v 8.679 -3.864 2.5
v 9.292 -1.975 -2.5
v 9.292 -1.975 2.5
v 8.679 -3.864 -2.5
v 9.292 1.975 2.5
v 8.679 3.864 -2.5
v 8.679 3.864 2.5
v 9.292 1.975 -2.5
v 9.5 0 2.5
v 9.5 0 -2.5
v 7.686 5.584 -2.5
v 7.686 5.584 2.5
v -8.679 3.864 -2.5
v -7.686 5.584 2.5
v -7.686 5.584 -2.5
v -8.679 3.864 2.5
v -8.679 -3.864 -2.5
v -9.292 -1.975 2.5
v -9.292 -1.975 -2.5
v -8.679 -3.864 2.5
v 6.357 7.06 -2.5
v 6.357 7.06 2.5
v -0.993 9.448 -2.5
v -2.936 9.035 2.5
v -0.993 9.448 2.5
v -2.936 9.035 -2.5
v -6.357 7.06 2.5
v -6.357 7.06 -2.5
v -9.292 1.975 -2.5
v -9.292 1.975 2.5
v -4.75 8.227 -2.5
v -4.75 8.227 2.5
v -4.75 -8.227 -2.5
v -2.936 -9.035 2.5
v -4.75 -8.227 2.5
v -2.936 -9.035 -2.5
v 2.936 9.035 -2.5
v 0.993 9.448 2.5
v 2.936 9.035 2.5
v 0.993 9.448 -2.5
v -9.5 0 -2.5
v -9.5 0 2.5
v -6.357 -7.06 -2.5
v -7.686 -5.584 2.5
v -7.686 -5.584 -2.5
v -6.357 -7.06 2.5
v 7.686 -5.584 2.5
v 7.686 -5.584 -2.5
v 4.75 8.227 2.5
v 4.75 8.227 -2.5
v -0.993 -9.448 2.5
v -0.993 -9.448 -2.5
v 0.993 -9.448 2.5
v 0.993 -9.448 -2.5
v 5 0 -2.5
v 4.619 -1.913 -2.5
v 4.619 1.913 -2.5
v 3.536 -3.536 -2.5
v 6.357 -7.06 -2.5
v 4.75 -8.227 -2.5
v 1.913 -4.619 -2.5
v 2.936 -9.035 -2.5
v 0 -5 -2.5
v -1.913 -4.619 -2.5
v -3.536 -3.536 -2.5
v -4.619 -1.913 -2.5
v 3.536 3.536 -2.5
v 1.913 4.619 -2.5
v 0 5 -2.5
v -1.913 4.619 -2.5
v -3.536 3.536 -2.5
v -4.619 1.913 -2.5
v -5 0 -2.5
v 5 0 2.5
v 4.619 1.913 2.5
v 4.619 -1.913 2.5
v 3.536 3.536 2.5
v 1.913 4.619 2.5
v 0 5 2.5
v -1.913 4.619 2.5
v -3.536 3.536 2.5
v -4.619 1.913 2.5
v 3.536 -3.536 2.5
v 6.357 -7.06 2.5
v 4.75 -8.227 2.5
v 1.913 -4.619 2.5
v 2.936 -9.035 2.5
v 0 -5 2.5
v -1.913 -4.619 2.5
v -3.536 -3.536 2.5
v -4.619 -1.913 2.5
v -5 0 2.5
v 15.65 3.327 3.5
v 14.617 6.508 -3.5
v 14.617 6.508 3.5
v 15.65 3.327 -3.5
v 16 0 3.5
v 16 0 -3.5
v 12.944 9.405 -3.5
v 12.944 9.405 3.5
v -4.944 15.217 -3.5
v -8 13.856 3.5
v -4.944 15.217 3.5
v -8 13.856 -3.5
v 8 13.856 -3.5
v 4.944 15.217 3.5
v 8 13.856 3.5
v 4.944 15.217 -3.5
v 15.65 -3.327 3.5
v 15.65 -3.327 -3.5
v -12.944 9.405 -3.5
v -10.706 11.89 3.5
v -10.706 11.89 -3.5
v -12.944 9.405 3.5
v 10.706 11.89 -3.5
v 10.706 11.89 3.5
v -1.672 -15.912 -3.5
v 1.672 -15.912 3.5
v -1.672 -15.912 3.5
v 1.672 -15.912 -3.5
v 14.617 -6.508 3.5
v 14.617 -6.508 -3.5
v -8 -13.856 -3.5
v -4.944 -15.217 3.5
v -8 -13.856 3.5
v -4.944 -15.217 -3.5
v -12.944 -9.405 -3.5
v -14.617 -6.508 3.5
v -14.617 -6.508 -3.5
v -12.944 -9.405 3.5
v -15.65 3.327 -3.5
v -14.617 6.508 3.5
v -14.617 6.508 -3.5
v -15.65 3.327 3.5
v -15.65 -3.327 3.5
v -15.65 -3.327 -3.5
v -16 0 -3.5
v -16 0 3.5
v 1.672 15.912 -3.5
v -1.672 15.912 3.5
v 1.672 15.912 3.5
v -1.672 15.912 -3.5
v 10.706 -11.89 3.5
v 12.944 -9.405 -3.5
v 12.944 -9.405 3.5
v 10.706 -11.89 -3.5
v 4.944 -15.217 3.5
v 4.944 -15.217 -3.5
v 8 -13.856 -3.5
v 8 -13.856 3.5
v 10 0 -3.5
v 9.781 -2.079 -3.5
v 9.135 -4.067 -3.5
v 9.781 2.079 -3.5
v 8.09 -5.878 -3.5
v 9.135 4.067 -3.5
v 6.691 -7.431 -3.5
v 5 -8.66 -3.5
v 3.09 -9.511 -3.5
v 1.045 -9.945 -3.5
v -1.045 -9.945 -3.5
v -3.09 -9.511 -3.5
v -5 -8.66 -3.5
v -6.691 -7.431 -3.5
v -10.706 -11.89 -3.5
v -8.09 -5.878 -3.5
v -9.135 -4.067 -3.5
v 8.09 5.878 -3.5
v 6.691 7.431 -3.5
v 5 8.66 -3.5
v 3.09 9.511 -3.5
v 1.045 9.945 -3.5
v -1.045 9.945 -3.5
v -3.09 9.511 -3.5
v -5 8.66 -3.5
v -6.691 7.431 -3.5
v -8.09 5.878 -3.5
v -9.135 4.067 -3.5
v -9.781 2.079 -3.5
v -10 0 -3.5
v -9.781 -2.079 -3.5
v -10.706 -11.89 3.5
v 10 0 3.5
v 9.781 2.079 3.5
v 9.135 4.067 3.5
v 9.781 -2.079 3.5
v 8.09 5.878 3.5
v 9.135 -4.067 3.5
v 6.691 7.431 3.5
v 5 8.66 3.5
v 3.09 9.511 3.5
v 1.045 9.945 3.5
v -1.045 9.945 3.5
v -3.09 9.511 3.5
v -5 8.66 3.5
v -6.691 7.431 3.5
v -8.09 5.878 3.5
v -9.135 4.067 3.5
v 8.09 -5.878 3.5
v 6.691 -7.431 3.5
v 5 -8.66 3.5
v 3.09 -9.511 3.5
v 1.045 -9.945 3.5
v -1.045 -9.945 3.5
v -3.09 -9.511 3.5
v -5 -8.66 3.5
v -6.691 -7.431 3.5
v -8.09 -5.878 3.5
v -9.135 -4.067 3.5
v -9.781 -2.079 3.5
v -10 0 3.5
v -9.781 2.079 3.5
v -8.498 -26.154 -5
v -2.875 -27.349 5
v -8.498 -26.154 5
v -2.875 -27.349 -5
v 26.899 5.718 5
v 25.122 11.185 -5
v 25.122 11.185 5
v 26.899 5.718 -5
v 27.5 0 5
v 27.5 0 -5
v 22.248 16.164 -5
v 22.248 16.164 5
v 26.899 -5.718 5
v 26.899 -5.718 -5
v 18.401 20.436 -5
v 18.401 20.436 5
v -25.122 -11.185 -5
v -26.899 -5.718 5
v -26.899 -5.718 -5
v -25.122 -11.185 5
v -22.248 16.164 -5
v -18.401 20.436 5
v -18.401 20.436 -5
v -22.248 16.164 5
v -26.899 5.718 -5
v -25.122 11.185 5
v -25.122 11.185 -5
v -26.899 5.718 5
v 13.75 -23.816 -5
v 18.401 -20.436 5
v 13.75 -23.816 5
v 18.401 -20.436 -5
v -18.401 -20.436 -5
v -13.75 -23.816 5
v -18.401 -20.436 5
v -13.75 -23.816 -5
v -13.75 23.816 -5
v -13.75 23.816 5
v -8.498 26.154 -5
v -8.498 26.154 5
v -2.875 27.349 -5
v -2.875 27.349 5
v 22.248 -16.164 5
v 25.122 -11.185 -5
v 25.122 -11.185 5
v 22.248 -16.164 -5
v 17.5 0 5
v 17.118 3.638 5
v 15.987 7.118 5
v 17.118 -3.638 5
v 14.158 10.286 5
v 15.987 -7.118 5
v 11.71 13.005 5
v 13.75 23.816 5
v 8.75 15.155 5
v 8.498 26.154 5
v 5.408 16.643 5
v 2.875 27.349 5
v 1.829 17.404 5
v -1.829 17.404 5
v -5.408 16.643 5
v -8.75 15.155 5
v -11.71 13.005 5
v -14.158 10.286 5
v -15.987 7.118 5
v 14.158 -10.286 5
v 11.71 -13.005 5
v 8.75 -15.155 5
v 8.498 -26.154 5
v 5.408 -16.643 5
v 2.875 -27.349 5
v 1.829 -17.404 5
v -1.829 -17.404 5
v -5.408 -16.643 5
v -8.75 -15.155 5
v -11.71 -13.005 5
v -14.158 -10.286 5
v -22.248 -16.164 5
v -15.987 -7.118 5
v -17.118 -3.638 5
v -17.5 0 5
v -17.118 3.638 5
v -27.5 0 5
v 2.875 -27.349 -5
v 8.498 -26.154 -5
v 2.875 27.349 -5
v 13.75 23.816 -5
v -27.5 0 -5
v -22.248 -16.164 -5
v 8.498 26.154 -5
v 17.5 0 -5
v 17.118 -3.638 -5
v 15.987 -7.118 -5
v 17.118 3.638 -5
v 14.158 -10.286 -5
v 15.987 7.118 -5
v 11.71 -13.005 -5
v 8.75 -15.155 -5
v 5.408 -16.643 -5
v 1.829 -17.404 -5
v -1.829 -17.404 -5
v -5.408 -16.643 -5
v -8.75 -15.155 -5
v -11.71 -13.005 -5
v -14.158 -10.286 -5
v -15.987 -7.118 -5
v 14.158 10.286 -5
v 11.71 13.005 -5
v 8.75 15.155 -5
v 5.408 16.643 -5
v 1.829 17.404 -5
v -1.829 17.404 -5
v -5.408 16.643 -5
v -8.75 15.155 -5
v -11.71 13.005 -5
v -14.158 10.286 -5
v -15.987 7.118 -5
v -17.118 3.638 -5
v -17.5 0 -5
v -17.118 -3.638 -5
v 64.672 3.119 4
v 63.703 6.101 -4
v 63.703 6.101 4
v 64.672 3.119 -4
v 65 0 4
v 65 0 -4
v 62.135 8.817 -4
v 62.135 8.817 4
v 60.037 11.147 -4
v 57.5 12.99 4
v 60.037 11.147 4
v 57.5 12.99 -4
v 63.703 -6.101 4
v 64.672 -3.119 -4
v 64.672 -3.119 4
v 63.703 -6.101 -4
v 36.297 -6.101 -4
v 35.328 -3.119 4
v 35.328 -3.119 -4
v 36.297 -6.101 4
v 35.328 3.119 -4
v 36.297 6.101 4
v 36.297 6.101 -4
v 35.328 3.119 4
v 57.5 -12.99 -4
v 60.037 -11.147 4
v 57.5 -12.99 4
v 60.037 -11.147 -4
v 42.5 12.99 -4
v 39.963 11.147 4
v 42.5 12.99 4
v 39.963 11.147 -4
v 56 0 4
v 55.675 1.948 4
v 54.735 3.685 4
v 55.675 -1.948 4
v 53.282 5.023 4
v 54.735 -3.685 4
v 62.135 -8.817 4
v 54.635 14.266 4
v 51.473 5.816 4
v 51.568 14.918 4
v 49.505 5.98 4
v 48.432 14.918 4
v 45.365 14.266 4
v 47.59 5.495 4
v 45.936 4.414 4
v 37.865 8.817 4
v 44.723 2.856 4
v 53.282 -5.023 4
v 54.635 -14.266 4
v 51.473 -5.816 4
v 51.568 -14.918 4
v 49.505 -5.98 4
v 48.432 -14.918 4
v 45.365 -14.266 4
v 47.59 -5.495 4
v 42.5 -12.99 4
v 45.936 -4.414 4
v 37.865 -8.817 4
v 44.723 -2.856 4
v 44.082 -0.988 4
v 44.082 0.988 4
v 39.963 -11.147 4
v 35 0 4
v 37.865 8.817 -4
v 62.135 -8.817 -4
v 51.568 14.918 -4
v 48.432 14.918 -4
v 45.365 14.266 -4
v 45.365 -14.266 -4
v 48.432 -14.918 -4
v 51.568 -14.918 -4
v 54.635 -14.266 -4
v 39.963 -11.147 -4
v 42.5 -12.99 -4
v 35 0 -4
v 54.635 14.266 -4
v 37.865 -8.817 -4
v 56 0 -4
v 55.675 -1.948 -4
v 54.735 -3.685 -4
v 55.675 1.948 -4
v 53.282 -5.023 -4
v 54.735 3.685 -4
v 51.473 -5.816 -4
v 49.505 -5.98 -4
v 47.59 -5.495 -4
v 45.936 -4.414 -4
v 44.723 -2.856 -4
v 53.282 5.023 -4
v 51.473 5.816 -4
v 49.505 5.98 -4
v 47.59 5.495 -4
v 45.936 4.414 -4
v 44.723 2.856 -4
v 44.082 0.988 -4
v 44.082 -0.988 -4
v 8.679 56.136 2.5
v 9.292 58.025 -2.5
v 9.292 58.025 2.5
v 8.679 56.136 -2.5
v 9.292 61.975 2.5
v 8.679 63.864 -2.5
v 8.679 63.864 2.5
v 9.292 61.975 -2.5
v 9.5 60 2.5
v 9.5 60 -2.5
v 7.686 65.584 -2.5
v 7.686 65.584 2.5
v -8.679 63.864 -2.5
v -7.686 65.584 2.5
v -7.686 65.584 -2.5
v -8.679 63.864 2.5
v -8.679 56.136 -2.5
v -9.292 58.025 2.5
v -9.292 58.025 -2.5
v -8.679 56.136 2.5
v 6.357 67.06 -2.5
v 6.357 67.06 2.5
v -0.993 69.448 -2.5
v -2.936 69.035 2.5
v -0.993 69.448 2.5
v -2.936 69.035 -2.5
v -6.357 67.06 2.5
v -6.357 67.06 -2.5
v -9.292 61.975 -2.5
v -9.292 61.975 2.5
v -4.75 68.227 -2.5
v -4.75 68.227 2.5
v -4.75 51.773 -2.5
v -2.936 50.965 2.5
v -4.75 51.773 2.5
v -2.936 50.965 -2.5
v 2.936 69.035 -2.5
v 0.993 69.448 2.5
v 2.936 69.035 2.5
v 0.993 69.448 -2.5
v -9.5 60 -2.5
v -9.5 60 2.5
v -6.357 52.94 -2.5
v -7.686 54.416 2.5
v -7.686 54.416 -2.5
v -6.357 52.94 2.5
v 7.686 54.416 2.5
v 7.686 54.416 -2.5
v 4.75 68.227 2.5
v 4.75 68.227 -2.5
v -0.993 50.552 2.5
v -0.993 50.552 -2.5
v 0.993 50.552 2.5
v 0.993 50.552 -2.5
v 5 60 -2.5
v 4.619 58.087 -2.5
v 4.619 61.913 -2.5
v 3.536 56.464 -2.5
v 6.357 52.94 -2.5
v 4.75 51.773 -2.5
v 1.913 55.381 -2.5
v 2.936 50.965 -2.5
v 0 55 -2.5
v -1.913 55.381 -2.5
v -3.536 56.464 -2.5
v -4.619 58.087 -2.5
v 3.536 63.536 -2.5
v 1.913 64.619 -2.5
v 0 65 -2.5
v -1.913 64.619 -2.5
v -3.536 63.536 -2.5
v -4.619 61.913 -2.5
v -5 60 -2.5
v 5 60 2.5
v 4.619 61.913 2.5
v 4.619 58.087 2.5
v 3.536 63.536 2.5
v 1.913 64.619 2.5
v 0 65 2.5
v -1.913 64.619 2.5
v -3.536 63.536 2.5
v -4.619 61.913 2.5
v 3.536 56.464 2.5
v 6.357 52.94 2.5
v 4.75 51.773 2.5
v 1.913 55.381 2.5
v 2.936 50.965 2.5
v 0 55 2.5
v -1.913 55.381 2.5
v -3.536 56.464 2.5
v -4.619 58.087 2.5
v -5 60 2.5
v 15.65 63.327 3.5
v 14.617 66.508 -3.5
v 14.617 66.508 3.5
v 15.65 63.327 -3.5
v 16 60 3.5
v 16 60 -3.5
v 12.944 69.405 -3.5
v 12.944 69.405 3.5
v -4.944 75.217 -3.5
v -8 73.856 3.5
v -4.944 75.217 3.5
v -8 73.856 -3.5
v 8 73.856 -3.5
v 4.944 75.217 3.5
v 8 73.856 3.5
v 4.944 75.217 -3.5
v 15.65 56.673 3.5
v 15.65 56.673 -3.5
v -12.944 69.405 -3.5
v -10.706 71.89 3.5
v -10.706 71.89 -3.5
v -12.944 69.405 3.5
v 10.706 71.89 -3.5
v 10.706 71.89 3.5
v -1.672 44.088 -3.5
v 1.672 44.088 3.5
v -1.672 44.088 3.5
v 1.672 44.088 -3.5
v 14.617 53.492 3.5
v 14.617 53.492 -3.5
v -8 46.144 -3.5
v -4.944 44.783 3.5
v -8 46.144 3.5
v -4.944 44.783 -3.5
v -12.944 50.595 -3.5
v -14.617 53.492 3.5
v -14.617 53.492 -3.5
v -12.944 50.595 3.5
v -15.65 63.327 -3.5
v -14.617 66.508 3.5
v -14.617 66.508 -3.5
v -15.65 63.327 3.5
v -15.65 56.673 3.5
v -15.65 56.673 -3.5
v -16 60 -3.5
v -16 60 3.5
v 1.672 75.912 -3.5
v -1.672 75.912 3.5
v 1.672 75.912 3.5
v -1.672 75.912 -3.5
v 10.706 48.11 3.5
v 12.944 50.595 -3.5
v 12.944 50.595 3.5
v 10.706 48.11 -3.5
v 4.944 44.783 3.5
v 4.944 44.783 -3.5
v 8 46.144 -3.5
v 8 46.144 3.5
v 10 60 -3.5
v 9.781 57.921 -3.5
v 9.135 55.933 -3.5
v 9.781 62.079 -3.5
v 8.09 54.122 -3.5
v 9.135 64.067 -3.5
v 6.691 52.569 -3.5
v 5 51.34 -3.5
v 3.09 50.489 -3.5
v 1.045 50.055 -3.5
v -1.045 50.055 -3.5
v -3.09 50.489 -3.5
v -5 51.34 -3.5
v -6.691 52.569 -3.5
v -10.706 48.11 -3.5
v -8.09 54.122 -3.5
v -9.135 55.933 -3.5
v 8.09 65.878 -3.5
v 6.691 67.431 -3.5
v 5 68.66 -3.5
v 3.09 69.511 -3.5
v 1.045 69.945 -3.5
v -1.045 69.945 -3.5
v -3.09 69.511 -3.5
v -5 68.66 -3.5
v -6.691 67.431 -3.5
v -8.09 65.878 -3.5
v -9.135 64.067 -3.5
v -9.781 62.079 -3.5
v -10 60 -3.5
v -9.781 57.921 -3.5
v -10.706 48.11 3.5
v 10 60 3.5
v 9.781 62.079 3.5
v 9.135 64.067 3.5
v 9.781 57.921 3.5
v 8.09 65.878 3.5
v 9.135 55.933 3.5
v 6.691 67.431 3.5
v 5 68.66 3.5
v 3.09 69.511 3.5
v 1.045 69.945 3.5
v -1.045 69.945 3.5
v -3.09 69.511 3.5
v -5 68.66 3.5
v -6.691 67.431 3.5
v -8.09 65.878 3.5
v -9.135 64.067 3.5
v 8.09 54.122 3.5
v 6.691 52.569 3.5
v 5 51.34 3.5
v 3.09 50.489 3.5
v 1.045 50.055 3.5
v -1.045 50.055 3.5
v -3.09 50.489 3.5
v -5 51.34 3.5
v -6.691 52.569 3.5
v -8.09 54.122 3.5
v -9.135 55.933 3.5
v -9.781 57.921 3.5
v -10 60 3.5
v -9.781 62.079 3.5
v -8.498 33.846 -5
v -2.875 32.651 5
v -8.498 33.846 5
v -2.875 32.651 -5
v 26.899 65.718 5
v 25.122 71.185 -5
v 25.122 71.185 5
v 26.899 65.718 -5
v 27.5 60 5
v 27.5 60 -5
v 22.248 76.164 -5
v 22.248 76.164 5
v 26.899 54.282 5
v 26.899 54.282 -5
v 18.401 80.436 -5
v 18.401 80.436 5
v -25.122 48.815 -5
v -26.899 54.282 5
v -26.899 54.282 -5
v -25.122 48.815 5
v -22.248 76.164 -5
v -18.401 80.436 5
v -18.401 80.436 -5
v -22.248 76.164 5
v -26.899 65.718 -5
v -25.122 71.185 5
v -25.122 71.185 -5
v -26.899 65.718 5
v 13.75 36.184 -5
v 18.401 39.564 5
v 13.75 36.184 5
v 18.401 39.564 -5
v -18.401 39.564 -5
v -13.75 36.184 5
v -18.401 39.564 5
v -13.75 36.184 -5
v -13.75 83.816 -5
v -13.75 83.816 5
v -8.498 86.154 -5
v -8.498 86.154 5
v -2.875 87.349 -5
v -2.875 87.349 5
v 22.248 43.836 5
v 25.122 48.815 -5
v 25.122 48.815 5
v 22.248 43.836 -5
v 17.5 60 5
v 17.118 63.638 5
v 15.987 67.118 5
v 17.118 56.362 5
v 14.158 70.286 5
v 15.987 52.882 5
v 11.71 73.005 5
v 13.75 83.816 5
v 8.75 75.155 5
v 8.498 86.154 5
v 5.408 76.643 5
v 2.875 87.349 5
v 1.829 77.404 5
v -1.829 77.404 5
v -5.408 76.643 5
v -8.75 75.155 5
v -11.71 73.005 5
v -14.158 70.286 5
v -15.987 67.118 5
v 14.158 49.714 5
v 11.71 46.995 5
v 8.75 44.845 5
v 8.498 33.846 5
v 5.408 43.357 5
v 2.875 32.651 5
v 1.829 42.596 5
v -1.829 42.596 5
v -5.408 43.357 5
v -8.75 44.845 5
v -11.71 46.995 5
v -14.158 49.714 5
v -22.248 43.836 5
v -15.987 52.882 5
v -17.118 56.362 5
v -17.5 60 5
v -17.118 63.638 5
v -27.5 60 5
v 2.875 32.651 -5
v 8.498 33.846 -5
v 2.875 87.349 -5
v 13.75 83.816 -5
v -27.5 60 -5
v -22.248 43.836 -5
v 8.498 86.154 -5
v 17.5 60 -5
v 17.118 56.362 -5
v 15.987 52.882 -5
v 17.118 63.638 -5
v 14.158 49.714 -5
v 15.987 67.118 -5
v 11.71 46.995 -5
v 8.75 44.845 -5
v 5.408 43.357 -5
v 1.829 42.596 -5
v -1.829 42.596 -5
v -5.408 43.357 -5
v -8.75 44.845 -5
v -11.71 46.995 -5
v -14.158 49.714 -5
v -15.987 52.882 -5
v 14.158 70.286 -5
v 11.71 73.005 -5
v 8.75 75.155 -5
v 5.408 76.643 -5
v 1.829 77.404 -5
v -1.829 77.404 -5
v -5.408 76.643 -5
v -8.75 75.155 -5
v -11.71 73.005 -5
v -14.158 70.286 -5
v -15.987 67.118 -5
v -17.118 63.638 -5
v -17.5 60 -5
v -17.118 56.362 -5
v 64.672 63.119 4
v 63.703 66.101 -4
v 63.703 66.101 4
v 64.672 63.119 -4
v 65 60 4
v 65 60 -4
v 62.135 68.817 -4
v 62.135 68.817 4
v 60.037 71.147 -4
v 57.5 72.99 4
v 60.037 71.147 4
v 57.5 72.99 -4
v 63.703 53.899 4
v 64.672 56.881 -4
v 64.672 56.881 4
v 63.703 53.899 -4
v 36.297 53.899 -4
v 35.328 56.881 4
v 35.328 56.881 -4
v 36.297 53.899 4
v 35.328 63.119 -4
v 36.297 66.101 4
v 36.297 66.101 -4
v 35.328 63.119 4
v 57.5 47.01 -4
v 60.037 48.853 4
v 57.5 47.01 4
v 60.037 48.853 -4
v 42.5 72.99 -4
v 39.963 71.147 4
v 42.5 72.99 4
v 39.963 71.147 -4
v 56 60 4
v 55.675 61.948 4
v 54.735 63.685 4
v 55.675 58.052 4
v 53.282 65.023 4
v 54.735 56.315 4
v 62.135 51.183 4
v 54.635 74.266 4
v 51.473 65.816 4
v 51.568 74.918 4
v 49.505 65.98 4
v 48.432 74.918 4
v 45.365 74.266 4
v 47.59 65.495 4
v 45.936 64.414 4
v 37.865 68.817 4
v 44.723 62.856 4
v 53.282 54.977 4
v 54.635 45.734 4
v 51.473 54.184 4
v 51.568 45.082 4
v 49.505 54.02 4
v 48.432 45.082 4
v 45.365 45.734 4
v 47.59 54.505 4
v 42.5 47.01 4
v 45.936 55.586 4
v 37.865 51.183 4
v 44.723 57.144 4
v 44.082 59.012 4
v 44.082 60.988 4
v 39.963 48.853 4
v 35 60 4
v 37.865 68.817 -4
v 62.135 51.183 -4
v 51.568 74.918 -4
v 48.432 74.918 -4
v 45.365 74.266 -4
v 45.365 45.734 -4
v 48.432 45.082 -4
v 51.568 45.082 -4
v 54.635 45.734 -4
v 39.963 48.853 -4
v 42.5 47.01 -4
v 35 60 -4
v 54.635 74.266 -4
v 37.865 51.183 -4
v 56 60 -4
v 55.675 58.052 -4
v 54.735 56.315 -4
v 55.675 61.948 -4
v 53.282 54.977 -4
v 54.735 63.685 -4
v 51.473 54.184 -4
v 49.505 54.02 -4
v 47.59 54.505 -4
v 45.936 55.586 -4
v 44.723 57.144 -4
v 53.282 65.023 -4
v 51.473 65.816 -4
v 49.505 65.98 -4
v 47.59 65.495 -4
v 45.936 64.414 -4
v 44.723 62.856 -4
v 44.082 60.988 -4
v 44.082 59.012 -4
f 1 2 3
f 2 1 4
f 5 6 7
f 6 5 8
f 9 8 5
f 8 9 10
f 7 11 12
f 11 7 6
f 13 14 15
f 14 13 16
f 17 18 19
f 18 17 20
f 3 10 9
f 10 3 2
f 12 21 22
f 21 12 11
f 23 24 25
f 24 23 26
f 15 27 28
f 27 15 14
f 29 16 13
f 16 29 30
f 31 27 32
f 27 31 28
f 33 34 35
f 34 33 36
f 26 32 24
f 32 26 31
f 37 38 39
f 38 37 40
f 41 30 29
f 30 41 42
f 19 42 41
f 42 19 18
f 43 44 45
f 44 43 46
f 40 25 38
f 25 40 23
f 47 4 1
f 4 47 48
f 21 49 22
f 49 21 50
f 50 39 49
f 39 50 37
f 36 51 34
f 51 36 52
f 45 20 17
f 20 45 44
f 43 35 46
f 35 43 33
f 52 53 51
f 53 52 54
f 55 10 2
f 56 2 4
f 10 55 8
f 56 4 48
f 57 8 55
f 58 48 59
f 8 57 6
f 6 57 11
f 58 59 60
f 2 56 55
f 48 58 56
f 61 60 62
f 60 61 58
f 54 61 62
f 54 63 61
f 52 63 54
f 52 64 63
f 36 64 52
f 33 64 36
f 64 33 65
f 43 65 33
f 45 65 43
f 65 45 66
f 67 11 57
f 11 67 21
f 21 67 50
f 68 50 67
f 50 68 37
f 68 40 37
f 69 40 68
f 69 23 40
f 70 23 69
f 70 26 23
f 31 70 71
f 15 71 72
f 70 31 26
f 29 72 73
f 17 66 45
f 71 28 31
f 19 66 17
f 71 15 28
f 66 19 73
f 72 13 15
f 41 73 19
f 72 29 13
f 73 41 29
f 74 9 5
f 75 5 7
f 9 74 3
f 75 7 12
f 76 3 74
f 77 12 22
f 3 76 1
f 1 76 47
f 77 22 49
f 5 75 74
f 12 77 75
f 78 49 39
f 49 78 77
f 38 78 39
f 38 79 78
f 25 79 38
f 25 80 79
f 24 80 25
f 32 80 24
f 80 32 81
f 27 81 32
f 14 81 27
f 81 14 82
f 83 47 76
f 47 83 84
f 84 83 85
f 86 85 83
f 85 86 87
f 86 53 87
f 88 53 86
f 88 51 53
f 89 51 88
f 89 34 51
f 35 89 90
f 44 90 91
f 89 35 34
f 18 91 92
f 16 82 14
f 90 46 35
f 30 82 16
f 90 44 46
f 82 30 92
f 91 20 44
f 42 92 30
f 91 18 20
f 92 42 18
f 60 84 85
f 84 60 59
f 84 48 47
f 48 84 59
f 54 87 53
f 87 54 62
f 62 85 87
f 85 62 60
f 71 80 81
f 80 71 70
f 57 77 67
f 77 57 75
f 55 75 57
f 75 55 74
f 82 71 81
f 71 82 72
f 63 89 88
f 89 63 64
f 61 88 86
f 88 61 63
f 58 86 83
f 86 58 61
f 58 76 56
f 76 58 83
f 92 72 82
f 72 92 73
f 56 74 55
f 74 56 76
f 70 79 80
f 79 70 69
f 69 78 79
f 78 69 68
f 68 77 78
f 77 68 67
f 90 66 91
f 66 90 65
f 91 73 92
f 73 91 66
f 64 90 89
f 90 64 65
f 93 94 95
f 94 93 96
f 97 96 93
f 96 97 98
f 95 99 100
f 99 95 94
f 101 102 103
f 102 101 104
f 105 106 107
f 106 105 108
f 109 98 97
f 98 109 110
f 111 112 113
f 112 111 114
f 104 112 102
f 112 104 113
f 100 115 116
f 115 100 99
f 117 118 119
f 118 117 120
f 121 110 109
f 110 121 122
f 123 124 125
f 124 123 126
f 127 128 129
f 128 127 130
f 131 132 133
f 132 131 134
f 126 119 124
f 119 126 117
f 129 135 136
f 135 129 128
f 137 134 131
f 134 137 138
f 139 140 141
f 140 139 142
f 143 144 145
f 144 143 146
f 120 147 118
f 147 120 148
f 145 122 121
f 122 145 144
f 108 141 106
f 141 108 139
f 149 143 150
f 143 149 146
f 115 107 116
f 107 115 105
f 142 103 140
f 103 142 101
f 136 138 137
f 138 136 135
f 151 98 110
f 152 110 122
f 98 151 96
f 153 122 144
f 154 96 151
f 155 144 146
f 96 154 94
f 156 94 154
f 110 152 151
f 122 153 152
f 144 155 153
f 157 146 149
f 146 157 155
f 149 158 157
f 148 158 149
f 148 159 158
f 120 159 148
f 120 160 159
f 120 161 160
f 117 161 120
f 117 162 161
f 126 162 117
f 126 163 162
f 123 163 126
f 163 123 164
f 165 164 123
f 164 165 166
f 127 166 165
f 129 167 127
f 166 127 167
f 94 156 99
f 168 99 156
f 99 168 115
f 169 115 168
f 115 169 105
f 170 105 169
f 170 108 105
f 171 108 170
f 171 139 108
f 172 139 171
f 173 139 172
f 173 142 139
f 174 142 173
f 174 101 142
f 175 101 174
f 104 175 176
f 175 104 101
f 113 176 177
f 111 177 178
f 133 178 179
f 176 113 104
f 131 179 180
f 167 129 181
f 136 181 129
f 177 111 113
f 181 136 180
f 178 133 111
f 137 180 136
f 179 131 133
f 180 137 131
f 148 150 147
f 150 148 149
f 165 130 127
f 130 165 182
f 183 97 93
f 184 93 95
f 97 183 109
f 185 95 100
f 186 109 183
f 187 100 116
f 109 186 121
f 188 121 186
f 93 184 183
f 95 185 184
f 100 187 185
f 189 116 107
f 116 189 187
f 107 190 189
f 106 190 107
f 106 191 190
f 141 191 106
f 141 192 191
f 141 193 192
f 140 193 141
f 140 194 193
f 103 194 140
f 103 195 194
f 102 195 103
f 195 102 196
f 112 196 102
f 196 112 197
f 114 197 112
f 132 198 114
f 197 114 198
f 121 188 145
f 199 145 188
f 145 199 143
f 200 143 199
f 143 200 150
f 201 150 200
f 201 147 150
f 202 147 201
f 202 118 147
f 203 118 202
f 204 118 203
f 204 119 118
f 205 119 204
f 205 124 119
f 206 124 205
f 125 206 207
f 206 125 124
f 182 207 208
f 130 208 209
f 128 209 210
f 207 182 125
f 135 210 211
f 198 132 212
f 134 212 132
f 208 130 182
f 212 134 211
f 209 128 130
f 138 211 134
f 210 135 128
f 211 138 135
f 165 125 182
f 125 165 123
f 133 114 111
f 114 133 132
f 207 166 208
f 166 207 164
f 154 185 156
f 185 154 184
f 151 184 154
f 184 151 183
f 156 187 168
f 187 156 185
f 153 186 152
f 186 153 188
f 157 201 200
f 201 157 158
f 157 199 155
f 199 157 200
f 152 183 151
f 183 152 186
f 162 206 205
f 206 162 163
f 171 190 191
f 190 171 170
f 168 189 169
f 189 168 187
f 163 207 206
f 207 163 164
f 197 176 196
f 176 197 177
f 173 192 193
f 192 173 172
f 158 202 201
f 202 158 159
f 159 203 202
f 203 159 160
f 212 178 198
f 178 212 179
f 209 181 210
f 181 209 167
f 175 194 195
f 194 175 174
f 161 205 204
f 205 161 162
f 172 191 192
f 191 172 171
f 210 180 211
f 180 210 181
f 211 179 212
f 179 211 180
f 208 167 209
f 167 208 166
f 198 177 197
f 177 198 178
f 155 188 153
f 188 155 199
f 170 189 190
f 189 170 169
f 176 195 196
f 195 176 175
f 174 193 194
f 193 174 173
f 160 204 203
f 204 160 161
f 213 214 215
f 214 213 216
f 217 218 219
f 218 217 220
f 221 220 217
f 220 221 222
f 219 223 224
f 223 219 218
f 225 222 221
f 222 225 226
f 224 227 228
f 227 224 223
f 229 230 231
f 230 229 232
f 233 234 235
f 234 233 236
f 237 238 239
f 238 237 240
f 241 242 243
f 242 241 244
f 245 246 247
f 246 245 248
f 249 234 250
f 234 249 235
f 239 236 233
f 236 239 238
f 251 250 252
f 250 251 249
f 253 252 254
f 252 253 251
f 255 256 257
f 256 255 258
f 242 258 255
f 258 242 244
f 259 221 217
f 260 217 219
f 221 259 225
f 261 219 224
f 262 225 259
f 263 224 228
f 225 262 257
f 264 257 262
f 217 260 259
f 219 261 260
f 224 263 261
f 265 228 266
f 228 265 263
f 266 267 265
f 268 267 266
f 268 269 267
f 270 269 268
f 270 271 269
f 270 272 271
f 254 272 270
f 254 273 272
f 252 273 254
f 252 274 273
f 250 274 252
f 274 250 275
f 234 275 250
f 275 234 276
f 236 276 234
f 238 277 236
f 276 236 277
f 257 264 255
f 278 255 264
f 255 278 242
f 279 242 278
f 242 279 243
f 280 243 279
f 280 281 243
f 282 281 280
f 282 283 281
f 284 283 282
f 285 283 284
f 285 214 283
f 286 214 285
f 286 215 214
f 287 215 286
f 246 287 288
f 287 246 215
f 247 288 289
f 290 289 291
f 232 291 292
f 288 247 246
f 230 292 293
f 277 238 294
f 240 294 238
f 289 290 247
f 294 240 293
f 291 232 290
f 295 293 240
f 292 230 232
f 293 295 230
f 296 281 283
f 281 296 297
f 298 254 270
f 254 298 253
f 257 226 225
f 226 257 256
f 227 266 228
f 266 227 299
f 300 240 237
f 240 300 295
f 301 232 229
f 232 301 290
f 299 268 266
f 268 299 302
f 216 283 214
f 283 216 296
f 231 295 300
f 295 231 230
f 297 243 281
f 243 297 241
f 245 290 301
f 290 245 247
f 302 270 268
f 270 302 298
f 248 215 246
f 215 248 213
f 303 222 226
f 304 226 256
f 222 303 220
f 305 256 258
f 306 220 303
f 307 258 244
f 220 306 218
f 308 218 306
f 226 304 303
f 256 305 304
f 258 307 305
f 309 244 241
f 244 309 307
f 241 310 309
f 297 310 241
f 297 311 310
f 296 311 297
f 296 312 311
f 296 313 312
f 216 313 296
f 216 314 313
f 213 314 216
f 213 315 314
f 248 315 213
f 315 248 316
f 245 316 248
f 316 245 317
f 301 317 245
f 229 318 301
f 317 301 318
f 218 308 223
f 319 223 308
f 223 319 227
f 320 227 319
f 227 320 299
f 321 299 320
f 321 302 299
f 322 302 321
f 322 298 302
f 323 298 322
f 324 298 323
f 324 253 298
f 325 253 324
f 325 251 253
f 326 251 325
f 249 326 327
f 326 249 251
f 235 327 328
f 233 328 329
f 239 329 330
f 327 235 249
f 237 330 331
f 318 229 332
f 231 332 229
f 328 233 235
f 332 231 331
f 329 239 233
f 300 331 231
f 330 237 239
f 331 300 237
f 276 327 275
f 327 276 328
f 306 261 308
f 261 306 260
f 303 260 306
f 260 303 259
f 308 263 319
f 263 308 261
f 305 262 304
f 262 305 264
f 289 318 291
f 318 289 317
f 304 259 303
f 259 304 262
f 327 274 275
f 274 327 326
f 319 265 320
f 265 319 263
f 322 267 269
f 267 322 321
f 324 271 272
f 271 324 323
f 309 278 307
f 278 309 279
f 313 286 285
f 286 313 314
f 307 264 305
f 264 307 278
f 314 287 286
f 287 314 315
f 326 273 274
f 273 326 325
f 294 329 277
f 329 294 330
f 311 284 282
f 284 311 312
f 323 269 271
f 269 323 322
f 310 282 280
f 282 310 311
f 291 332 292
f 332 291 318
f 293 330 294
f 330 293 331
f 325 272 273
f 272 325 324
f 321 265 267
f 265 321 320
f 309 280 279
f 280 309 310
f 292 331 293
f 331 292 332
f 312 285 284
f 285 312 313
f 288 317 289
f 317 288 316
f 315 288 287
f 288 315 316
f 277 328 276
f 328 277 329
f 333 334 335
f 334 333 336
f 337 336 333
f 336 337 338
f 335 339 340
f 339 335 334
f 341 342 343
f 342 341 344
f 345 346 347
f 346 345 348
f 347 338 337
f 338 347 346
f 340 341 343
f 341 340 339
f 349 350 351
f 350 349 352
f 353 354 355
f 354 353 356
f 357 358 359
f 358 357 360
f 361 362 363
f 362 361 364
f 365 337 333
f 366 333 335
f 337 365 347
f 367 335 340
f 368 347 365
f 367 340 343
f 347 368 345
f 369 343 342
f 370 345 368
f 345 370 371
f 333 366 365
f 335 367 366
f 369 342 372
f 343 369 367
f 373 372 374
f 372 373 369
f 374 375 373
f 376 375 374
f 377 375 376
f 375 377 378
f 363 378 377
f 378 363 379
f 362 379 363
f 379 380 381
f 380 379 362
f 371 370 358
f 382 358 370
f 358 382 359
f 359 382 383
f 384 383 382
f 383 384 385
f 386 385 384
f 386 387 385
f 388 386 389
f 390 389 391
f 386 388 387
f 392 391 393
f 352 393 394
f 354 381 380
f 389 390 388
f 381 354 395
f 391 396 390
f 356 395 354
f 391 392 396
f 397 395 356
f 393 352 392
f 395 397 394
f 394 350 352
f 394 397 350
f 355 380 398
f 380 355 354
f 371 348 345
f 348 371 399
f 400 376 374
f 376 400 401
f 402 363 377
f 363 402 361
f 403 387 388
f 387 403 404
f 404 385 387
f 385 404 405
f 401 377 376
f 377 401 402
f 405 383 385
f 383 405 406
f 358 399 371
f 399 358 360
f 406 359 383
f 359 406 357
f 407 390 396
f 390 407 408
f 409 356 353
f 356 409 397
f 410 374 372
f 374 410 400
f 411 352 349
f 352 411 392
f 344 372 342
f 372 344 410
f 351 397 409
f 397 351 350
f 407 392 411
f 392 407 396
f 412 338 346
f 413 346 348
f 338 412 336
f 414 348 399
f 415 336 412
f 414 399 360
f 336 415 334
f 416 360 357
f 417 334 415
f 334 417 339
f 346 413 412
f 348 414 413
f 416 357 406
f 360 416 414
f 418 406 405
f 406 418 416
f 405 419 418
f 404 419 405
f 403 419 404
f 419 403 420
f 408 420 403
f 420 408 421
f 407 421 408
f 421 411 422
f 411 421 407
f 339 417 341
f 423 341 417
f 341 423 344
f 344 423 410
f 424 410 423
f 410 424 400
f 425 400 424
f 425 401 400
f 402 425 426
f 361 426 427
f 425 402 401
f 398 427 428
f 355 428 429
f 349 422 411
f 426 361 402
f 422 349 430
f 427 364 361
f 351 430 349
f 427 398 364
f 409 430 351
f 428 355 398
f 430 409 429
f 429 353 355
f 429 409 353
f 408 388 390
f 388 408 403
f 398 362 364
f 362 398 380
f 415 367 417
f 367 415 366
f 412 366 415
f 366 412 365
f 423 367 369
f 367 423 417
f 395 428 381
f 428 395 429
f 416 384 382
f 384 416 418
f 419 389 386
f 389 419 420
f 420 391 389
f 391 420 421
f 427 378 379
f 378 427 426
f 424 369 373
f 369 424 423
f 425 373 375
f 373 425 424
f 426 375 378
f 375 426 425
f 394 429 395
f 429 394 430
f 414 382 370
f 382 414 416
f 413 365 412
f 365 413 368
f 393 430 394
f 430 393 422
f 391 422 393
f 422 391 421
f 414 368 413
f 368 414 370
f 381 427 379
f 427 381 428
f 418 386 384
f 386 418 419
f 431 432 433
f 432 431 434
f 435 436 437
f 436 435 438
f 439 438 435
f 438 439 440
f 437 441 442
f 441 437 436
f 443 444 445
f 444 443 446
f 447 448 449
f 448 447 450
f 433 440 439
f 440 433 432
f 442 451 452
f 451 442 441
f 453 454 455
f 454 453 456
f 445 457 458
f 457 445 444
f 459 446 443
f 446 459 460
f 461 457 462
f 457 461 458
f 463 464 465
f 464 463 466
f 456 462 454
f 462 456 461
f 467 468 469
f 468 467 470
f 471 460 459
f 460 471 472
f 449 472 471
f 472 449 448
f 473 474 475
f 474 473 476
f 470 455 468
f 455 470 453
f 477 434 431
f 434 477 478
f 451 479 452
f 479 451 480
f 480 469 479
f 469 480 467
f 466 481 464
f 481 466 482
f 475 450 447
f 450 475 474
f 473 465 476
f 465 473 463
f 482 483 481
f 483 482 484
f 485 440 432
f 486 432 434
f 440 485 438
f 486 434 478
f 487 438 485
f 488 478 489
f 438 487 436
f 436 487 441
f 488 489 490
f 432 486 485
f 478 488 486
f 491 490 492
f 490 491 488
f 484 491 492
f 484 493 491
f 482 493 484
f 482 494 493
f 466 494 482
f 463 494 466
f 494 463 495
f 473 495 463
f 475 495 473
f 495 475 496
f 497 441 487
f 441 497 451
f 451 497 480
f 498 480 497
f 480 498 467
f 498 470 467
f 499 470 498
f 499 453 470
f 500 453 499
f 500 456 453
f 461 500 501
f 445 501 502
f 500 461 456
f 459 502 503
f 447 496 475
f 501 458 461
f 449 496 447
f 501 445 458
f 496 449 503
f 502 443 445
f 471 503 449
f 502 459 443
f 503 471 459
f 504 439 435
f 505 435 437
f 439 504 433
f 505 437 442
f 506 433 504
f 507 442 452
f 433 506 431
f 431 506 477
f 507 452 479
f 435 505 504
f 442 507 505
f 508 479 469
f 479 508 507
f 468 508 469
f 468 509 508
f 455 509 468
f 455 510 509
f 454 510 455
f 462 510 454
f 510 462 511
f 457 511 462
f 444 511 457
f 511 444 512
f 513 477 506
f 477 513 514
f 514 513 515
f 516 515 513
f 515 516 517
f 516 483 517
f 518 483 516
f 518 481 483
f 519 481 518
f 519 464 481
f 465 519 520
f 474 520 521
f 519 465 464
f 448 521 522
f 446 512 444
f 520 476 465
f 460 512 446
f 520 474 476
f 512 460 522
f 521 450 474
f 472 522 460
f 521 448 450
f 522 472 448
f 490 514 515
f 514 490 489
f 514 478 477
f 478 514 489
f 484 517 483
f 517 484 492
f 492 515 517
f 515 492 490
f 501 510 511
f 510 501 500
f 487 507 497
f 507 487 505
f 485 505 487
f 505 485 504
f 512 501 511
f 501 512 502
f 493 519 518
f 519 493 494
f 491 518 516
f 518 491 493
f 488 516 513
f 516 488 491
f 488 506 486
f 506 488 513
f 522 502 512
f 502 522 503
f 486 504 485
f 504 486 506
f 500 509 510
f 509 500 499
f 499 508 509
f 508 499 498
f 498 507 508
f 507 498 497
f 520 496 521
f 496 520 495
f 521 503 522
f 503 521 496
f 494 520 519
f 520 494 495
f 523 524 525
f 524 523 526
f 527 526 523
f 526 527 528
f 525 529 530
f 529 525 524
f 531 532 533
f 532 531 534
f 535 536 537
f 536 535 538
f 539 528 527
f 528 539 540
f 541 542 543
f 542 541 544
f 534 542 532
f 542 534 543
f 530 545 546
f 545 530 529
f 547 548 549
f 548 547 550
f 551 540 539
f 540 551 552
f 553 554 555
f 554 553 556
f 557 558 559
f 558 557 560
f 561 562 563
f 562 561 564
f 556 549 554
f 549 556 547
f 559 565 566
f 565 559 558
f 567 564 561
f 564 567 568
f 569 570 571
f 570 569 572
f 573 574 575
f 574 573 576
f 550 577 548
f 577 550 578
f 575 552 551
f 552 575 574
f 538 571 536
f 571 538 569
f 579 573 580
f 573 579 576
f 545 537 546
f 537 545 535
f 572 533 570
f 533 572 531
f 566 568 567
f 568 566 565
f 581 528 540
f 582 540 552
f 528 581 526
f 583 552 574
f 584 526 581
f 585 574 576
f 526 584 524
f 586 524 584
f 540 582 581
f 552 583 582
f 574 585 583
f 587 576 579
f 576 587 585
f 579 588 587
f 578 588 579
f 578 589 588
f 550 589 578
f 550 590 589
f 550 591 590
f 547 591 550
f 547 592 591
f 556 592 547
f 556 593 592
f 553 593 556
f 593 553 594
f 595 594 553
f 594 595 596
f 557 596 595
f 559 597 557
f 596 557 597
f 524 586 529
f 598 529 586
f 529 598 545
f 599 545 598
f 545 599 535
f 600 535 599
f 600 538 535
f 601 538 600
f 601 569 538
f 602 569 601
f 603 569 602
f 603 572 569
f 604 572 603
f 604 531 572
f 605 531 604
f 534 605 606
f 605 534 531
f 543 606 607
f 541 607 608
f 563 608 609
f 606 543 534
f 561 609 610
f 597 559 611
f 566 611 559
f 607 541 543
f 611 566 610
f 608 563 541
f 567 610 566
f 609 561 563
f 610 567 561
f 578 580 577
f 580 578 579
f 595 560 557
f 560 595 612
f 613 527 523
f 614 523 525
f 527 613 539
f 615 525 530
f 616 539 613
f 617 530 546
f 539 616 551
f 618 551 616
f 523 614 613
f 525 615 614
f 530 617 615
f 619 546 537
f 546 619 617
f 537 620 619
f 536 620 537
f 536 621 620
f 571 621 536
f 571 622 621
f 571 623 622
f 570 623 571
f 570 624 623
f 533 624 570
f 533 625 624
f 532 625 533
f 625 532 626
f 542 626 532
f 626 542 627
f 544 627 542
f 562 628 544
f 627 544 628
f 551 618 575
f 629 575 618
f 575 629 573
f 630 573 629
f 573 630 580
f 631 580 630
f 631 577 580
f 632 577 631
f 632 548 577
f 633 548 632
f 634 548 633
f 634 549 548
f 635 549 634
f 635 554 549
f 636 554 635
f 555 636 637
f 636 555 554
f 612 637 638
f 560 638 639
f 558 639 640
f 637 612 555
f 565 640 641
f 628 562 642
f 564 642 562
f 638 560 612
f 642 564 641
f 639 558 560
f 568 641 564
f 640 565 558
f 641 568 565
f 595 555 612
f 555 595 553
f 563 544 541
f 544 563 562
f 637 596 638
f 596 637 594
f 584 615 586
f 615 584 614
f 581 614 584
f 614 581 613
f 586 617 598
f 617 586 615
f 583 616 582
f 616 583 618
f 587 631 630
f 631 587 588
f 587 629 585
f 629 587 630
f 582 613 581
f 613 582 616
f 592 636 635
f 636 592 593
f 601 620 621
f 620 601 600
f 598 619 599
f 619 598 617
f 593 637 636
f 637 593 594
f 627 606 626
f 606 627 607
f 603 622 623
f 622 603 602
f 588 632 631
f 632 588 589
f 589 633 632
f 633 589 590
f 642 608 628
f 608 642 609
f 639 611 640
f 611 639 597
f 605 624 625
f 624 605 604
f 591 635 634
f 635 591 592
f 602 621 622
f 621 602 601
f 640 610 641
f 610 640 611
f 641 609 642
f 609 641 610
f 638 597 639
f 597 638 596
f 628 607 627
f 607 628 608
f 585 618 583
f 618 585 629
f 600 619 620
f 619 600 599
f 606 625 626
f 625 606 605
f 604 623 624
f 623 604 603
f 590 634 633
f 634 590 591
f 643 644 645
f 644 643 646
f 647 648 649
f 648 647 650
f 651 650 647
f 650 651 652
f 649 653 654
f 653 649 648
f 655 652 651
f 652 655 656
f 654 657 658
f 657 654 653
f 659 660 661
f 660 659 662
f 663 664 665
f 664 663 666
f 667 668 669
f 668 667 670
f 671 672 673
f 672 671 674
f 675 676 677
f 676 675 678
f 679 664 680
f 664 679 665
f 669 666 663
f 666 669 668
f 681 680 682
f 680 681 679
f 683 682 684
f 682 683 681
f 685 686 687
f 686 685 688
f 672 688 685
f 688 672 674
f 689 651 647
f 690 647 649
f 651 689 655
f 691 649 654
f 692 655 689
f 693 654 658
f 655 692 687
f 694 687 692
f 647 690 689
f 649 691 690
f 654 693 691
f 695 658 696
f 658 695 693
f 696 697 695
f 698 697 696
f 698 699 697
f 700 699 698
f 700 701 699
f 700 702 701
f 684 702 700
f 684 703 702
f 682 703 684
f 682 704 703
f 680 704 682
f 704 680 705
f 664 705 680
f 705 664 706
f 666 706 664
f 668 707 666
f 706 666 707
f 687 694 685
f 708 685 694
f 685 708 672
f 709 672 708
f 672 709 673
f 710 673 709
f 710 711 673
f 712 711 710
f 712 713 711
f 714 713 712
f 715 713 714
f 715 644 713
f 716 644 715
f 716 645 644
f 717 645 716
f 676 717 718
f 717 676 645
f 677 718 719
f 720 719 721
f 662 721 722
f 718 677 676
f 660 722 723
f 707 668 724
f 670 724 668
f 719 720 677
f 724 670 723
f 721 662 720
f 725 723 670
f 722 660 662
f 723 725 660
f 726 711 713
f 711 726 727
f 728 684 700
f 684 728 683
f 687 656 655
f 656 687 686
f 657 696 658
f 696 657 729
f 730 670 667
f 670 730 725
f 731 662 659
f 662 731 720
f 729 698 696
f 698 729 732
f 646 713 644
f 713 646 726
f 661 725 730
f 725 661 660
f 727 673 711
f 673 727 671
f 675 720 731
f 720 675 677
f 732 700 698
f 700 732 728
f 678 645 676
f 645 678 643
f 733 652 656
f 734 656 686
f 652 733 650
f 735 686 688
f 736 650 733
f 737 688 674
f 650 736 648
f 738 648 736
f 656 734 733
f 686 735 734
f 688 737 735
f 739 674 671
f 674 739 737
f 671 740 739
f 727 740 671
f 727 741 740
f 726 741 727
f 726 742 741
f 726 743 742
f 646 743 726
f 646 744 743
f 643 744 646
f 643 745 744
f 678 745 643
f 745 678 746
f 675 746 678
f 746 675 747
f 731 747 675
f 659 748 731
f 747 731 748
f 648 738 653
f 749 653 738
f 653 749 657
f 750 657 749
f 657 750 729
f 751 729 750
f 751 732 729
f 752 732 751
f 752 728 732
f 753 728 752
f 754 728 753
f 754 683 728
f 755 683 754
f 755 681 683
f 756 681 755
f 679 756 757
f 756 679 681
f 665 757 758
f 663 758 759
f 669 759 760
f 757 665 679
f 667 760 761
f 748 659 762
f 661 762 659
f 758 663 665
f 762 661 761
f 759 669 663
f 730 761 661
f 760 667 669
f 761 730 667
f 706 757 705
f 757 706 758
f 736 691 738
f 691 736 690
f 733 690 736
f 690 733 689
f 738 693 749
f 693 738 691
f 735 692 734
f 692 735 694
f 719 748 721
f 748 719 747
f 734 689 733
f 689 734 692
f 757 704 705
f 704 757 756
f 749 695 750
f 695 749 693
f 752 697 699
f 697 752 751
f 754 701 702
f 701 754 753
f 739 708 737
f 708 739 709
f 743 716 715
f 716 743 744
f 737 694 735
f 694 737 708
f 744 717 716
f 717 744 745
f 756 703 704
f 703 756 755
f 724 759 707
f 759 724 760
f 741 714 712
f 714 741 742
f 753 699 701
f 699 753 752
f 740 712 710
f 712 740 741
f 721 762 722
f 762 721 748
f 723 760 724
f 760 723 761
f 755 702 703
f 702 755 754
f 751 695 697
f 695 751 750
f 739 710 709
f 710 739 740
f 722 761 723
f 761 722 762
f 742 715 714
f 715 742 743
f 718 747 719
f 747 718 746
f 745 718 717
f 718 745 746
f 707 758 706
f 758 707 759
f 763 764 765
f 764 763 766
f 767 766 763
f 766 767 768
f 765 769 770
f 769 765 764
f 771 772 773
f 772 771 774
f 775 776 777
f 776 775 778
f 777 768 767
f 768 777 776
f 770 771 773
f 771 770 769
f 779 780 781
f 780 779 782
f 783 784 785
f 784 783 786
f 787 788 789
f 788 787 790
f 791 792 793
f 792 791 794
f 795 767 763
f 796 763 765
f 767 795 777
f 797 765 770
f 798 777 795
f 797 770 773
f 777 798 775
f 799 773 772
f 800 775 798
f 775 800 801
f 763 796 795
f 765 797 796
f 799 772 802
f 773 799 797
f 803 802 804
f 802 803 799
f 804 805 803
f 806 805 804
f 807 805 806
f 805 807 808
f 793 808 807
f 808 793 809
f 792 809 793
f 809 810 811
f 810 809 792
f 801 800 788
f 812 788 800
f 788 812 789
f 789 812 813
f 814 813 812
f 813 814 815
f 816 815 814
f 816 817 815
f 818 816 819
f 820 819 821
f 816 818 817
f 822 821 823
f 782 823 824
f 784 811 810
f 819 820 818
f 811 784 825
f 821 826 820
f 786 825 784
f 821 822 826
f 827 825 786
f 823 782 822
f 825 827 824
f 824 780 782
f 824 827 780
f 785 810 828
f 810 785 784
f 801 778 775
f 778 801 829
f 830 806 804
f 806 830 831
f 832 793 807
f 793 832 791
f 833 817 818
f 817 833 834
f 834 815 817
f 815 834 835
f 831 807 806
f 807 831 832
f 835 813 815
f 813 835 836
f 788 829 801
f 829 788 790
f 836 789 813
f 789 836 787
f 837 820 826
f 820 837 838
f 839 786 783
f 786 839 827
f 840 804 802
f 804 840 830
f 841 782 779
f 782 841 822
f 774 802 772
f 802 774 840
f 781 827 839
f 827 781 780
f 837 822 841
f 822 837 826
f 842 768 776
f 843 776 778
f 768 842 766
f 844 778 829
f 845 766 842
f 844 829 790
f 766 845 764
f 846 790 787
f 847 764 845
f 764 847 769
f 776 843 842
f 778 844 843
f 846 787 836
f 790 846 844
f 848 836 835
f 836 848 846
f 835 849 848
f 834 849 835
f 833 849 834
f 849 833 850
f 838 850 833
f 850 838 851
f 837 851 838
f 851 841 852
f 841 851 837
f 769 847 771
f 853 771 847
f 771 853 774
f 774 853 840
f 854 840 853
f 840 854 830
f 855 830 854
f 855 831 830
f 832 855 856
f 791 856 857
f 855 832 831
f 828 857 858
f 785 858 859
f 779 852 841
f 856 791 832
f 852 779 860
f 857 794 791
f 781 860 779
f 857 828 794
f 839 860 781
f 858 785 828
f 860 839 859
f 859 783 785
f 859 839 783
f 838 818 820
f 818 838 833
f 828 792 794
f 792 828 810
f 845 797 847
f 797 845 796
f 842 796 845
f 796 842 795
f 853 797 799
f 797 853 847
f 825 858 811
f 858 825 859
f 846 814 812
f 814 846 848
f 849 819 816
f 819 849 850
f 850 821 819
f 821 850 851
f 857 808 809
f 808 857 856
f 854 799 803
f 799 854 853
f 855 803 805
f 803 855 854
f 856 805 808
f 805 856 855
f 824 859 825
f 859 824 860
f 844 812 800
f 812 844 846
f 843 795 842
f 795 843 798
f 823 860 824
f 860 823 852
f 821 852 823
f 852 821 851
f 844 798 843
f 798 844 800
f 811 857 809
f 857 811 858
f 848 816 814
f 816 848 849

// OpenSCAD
$useMcMaster = true;
module bearing(id, od, wd, mcmaster, series, labels=false){
    //echo(str("Creating a ", series, " bearing with id=", id, "mm od=", od, "mm width=", wd, "mm ..."));
    difference(){
        color("grey")cylinder(d=od,h=wd, center=true);
        color("white")cylinder(d=id,h=wd+1, center=true);  
        if($preview && labels){
            bearing_lettering(id, od, wd, mcmaster, series);
        }
    }
}

module bearing_lettering(id, od, wd, mcmaster, series)
{
    degreesSeries = 25*len(series);
    degreesMcMaster = 25*len(mcmaster);
    color("black")
    rotate(180+45){
        rotate(degreesSeries)
        bearing_text(id,od, wd, series,degreesSeries);
        if($useMcMaster){
            rotate(degreesMcMaster+degreesSeries+10)
            bearing_text(id,od, wd, mcmaster, degreesMcMaster);   
        }
    }
}

module bearing_text(id, od, wd, st, radiusConsumed=180){
    bearingGirth = (od-id)/2;
    letterHeight = bearingGirth * 0.6;
    letterOffsetFromCenter = (od/2) - (bearingGirth*0.9);
    
    width=bearingGirth ;
    thickness=wd/20 ;
    chars=len(st)+1 ;
    //echo(str("Writing ", st, " at " , letterOffsetFromCenter, "mm from center"));
    for (i = [1:chars]) {
            rotate([0,0,90-(i*(radiusConsumed/chars))])
            translate([0,letterOffsetFromCenter,(bearingGirth/2)-((thickness+1)/2)])
            linear_extrude(thickness+1)
            text(st[i-1],size=letterHeight, halign="center");
    }
}


module bearing_608(labels=true){ bearing(8,22,7,"5972K91","608", labels=labels); }
module bearing_626(labels=true){ bearing(6,19,6,"6661K11","626", labels=labels); }
module bearing_629(labels=true){ bearing(9,26,8,"5972K93","629", labels=labels); }
module bearing_635(labels=true){ bearing(5,19,6,"5972K197","635", labels=labels); }
module bearing_6000(labels=true){ bearing(10,26,8,"5972K94","6000", labels=labels); }
module bearing_6001(labels=true){ bearing(12,28,8,"5972K95","6001", labels=labels); }
module bearing_6002(labels=true){ bearing(15,32,9,"5972K358","6002", labels=labels); }
module bearing_6003(labels=true){ bearing(17,35,10,"5972K311","6003", labels=labels); }
module bearing_6007(labels=true){ bearing(35,62,14,"5972K312","6007", labels=labels); }
module bearing_6200(labels=true){ bearing(10,30,9,"5972K101","6200", labels=labels); }
module bearing_6201(labels=true){ bearing(12,32,10,"5972K313","6201", labels=labels); }
module bearing_6202(labels=true){ bearing(15,35,11,"5972K314","6202", labels=labels); }
module bearing_6203(labels=true){ bearing(17,40,12,"5972K104","6203", labels=labels); }
module bearing_6204(labels=true){ bearing(20,47,14,"5972K105","6204", labels=labels); }
module bearing_6205(labels=true){ bearing(25,52,15,"5972K315","6205", labels=labels); }
module bearing_6206(labels=true){ bearing(30,62,16,"5972K316","6206", labels=labels); }
module bearing_6207(labels=true){ bearing(35,72,17,"5972K317","6207", labels=labels); }
module bearing_6208(labels=true){ bearing(40,80,18,"5972K114","6208", labels=labels); }
module bearing_6209(labels=true){ bearing(45,85,19,"5972K115","6209", labels=labels); }
module bearing_6210(labels=true){ bearing(50,90,20,"5972K129","6210", labels=labels); }
module bearing_6211(labels=true){ bearing(55,100,21,"5972K113","6211", labels=labels); }
module bearing_6212(labels=true){ bearing(60,110,22,"5972K3","6212", labels=labels); }
module bearing_6301(labels=true){ bearing(12,37,12,"5972K318","6301", labels=labels); }
module bearing_6302(labels=true){ bearing(15,42,13,"5972K117","6302", labels=labels); }
module bearing_6303(labels=true){ bearing(17,47,14,"5972K118","6303", labels=labels); }
module bearing_6304(labels=true){ bearing(20,52,15,"5972K119","6304", labels=labels); }
module bearing_6305(labels=true){ bearing(25,62,17,"5972K121","6305", labels=labels); }
module bearing_6306(labels=true){ bearing(30,72,19,"5972K319","6306", labels=labels); }
module bearing_6307(labels=true){ bearing(35,80,21,"5972K503","6307", labels=labels); }
module bearing_6308(labels=true){ bearing(40,90,23,"5972K124","6308", labels=labels); }
module bearing_6309(labels=true){ bearing(45,100,25,"5972K125","6309", labels=labels); }
module bearing_6310(labels=true){ bearing(50,110,27,"5972K126","6310", labels=labels); }
module bearing_6311(labels=true){ bearing(55,120,29,"5972K127","6311", labels=labels); }
module bearing_6312(labels=true){ bearing(60,130,31,"5972K128","6312", labels=labels); }
module bearing_6403(labels=true){ bearing(17,62,17,"5972K198","6403", labels=labels); }
module bearing_6800(labels=true){ bearing(10,19,5,"5972K211","6800", labels=labels); }
module bearing_6801(labels=true){ bearing(12,21,5,"5972K212","6801", labels=labels); }
module bearing_6802(labels=true){ bearing(15,24,5,"5972K213","6802", labels=labels); }
module bearing_6803(labels=true){ bearing(17,26,5,"5972K214","6803", labels=labels); }
module bearing_6804(labels=true){ bearing(20,32,7,"5972K215","6804", labels=labels); }
module bearing_6805(labels=true){ bearing(25,37,7,"5972K216","6805", labels=labels); }
module bearing_6806(labels=true){ bearing(30,42,7,"5972K217","6806", labels=labels); }
module bearing_6900(labels=true){ bearing(10,22,6,"5972K241","6900", labels=labels); }
module bearing_6901(labels=true){ bearing(12,24,6,"5972K242","6901", labels=labels); }
module bearing_6902(labels=true){ bearing(15,28,7,"5972K243","6902", labels=labels); }
module bearing_6903(labels=true){ bearing(17,30,7,"5972K244","6903", labels=labels); }
module bearing_6904(labels=true){ bearing(20,37,9,"5972K245","6904", labels=labels); }
module bearing_6905(labels=true){ bearing(25,42,9,"5972K246","6905", labels=labels); }
module bearing_6906(labels=true){ bearing(30,47,9,"5972K247","6906", labels=labels); }
module bearing_6907(labels=true){ bearing(35,55,10,"5972K248","6907", labels=labels); }
module bearing_6908(labels=true){ bearing(40,62,12,"5972K249","6908", labels=labels); }
module bearing_16002(labels=true){ bearing(15,32,8,"5972K199","16002", labels=labels); }
module bearing_16004(labels=true){ bearing(20,42,8,"5972K218","16004", labels=labels); }
module bearing_16005(labels=true){ bearing(25,47,8,"5972K219","16005", labels=labels); }
module bearing_16100(labels=true){ bearing(10,28,8,"5972K223","16100", labels=labels); }
module bearing_16101(labels=true){ bearing(12,30,8,"5972K224","16101", labels=labels); }

translate([0,0,0])
{
    bearing_6800();
    bearing_6804();
    bearing_6907();
    translate([50,0,0])
    bearing_16101();
}


translate([0,60,0])
{
    bearing_6800(labels=false);
    bearing_6804(labels=false);
    bearing_6907(labels=false);
    translate([50,0,0])
    bearing_16101(labels=false);
}
